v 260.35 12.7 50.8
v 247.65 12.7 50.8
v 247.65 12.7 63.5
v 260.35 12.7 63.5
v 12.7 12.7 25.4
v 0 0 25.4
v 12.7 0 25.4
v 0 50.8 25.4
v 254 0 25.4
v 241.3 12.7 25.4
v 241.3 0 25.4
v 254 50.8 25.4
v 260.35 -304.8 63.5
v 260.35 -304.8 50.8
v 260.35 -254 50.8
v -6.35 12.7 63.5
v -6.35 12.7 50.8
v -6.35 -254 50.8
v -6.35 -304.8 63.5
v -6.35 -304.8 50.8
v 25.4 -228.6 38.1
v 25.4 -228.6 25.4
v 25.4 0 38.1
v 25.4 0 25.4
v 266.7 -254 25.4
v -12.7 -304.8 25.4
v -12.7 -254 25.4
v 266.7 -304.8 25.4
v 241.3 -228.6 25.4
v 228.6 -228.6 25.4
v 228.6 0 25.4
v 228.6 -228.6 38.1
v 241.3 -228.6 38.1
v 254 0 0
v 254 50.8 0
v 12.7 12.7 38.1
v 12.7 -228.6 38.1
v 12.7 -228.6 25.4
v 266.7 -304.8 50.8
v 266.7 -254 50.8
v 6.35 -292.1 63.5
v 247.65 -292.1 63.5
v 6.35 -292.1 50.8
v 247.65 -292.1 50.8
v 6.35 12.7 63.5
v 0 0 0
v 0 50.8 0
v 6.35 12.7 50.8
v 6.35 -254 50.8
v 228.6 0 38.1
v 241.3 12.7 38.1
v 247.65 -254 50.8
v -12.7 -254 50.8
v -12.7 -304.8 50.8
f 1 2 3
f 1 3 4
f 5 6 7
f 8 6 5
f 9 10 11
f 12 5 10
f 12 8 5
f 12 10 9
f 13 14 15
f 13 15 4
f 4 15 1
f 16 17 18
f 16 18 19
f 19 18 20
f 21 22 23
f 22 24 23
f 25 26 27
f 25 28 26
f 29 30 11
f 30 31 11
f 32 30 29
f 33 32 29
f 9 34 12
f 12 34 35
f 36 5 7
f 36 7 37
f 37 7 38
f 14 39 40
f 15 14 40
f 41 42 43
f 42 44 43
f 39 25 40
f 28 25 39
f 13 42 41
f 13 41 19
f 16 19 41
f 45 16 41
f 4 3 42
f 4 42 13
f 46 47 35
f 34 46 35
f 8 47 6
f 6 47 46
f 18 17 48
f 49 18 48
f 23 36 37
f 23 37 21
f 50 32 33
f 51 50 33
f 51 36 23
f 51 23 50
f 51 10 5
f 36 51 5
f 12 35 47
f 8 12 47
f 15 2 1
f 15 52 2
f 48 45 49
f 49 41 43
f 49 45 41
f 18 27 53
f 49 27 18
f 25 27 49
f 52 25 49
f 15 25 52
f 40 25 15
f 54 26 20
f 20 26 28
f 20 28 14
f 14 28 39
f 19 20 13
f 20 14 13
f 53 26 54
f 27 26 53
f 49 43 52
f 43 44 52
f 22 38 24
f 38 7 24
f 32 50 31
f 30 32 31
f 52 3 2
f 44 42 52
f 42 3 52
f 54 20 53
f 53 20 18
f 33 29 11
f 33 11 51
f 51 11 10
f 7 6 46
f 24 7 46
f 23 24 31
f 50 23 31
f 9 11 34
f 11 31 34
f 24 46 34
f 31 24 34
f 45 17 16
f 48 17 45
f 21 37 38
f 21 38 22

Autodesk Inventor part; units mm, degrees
ref_plane "YZ Plane" through (0, 0, 0) normal (1, 0, 0) x (0, 1, 0)
ref_plane "XZ Plane" through (0, 0, 0) normal (0, 1, 0) x (-1, 0, 0)
ref_plane "XY Plane" through (0, 0, 0) normal (0, 0, 1) x (1, 0, 0)
sketch "Sketch1" plane through (0, 0, 0) normal (0, 0, 1) x (1, 0, 0)
  line L0 (0, 0) -> (254, 0)
  line L1 (254, 0) -> (254, 50.8)
  line L2 (254, 50.8) -> (0, 50.8)
  line L3 (0, 50.8) -> (0, 0)
  dimension "d0" = 254
  dimension "d1" = 50.8
extrude "Extrusion1" add sketch "Sketch1" along normal blind 25.4
sketch "Sketch2" plane through (0, 0, 25.4) normal (0, 0, 1) x (1, 0, 0)
  line L0 (0, 0) -> (254, 0) projected
  line L1 (0, 50.8) -> (0, 0) projected
  line L2 (0, -254) -> (254, -254)
  line L3 (254, -254) -> (254, -304.8)
  line L4 (254, -304.8) -> (0, -304.8)
  line L5 (0, -304.8) -> (0, -254)
  dimension "d4" = 254
  dimension "d5" = 0
  dimension "d6" = 50.8
extrude "Extrusion2" add sketch "Sketch2" along normal blind 25.4
sketch "Sketch3" plane through (0, 0, 25.4) normal (0, 0, 1) x (1, 0, 0)
  line L0 (0, 0) -> (254, 0) projected
  line L1 (12.7, 0) -> (241.3, 0)
  line L2 (241.3, 0) -> (241.3, 12.7)
  line L3 (241.3, 12.7) -> (12.7, 12.7)
  line L4 (12.7, 12.7) -> (12.7, 0)
  dimension "d9" = 12.7
extrude "Extrusion3" add sketch "Sketch3" along normal blind 12.7
thicken "Thicken1" operation add thickness 12.7 both sides no extend neighbours yes toward (1, 0, 0) faces at (254, -270.9333, 33.8667)
thicken "Thicken2" operation add thickness 12.7 both sides no extend neighbours yes toward (-1, 0, 0) faces at (0, -287.8667, 33.8667)
sketch "Sketch4" plane through (0, 0, 50.8) normal (0, 0, 1) x (1, 0, 0)
  point P0 (0, 0)
sketch "Sketch5" plane through (0, 0, 50.8) normal (0, 0, 1) x (1, 0, 0)
  point P0 (0, 0)
sketch "Sketch6" plane through (0, 0, 50.8) normal (0, 0, 1) x (1, 0, 0)
  point P0 (0, 0)
sketch "Sketch7" plane through (0, 0, 50.8) normal (0, 0, 1) x (1, 0, 0)
  line L0 (-12.7, -304.8) -> (266.7, -304.8) projected
  line L1 (-6.35, -304.8) -> (260.35, -304.8)
  line L2 (260.35, -304.8) -> (260.35, -292.1)
  line L3 (260.35, -292.1) -> (-6.35, -292.1)
  line L4 (-6.35, -292.1) -> (-6.35, -304.8)
  point P0 (0, 0)
  dimension "d16" = 12.7
extrude "Extrusion4" add sketch "Sketch7" along normal blind 12.7
sketch "Sketch8" plane through (-6.35, -292.1, 50.8) normal (0, 1, 0) x (1, 0, 0)
  line L0 (0, 0) -> (0, -12.7) projected
  line L1 (0, 0) -> (266.7, 0) projected
  line L2 (0, -12.7) -> (12.7, -12.7)
  line L3 (12.7, -12.7) -> (12.7, 0)
  line L4 (12.7, 0) -> (0, 0)
  line L5 (0, 0) -> (0, -12.7)
  line L6 (266.7, 0) -> (266.7, -12.7) projected
  line L7 (266.7, -12.7) -> (254, -12.7)
  line L8 (254, -12.7) -> (254, 0)
  line L9 (254, 0) -> (266.7, 0)
  line L10 (266.7, 0) -> (266.7, -12.7)
  point P0 (6.35, 50.8)
  dimension "d19" = 12.7
  dimension "d20" = 12.7
extrude "Extrusion5" add sketch "Sketch8" along normal blind 304.8
sketch "Sketch9" plane through (0, 0, 0) normal (0, -1, 0) x (1, 0, 0)
  line L0 (0, 25.4) -> (12.7, 25.4) projected
  line L1 (241.3, 38.1) -> (12.7, 38.1) projected
  line L2 (12.7, 25.4) -> (25.4, 25.4)
  line L3 (25.4, 25.4) -> (25.4, 38.1)
  line L4 (25.4, 38.1) -> (12.7, 38.1)
  line L5 (12.7, 38.1) -> (12.7, 25.4)
  line L6 (241.3, 25.4) -> (241.3, 38.1) projected
  line L7 (241.3, 38.1) -> (228.6, 38.1)
  line L8 (228.6, 38.1) -> (228.6, 25.4)
  line L9 (228.6, 25.4) -> (241.3, 25.4)
  line L10 (241.3, 25.4) -> (241.3, 38.1)
  point P0 (0, 0)
  dimension "d23" = 12.7
  dimension "d24" = 12.7
  dimension "d25" = 12.7
extrude "Extrusion6" add sketch "Sketch9" along normal blind 228.6
properties part number "Foldedcapballliftholders"
